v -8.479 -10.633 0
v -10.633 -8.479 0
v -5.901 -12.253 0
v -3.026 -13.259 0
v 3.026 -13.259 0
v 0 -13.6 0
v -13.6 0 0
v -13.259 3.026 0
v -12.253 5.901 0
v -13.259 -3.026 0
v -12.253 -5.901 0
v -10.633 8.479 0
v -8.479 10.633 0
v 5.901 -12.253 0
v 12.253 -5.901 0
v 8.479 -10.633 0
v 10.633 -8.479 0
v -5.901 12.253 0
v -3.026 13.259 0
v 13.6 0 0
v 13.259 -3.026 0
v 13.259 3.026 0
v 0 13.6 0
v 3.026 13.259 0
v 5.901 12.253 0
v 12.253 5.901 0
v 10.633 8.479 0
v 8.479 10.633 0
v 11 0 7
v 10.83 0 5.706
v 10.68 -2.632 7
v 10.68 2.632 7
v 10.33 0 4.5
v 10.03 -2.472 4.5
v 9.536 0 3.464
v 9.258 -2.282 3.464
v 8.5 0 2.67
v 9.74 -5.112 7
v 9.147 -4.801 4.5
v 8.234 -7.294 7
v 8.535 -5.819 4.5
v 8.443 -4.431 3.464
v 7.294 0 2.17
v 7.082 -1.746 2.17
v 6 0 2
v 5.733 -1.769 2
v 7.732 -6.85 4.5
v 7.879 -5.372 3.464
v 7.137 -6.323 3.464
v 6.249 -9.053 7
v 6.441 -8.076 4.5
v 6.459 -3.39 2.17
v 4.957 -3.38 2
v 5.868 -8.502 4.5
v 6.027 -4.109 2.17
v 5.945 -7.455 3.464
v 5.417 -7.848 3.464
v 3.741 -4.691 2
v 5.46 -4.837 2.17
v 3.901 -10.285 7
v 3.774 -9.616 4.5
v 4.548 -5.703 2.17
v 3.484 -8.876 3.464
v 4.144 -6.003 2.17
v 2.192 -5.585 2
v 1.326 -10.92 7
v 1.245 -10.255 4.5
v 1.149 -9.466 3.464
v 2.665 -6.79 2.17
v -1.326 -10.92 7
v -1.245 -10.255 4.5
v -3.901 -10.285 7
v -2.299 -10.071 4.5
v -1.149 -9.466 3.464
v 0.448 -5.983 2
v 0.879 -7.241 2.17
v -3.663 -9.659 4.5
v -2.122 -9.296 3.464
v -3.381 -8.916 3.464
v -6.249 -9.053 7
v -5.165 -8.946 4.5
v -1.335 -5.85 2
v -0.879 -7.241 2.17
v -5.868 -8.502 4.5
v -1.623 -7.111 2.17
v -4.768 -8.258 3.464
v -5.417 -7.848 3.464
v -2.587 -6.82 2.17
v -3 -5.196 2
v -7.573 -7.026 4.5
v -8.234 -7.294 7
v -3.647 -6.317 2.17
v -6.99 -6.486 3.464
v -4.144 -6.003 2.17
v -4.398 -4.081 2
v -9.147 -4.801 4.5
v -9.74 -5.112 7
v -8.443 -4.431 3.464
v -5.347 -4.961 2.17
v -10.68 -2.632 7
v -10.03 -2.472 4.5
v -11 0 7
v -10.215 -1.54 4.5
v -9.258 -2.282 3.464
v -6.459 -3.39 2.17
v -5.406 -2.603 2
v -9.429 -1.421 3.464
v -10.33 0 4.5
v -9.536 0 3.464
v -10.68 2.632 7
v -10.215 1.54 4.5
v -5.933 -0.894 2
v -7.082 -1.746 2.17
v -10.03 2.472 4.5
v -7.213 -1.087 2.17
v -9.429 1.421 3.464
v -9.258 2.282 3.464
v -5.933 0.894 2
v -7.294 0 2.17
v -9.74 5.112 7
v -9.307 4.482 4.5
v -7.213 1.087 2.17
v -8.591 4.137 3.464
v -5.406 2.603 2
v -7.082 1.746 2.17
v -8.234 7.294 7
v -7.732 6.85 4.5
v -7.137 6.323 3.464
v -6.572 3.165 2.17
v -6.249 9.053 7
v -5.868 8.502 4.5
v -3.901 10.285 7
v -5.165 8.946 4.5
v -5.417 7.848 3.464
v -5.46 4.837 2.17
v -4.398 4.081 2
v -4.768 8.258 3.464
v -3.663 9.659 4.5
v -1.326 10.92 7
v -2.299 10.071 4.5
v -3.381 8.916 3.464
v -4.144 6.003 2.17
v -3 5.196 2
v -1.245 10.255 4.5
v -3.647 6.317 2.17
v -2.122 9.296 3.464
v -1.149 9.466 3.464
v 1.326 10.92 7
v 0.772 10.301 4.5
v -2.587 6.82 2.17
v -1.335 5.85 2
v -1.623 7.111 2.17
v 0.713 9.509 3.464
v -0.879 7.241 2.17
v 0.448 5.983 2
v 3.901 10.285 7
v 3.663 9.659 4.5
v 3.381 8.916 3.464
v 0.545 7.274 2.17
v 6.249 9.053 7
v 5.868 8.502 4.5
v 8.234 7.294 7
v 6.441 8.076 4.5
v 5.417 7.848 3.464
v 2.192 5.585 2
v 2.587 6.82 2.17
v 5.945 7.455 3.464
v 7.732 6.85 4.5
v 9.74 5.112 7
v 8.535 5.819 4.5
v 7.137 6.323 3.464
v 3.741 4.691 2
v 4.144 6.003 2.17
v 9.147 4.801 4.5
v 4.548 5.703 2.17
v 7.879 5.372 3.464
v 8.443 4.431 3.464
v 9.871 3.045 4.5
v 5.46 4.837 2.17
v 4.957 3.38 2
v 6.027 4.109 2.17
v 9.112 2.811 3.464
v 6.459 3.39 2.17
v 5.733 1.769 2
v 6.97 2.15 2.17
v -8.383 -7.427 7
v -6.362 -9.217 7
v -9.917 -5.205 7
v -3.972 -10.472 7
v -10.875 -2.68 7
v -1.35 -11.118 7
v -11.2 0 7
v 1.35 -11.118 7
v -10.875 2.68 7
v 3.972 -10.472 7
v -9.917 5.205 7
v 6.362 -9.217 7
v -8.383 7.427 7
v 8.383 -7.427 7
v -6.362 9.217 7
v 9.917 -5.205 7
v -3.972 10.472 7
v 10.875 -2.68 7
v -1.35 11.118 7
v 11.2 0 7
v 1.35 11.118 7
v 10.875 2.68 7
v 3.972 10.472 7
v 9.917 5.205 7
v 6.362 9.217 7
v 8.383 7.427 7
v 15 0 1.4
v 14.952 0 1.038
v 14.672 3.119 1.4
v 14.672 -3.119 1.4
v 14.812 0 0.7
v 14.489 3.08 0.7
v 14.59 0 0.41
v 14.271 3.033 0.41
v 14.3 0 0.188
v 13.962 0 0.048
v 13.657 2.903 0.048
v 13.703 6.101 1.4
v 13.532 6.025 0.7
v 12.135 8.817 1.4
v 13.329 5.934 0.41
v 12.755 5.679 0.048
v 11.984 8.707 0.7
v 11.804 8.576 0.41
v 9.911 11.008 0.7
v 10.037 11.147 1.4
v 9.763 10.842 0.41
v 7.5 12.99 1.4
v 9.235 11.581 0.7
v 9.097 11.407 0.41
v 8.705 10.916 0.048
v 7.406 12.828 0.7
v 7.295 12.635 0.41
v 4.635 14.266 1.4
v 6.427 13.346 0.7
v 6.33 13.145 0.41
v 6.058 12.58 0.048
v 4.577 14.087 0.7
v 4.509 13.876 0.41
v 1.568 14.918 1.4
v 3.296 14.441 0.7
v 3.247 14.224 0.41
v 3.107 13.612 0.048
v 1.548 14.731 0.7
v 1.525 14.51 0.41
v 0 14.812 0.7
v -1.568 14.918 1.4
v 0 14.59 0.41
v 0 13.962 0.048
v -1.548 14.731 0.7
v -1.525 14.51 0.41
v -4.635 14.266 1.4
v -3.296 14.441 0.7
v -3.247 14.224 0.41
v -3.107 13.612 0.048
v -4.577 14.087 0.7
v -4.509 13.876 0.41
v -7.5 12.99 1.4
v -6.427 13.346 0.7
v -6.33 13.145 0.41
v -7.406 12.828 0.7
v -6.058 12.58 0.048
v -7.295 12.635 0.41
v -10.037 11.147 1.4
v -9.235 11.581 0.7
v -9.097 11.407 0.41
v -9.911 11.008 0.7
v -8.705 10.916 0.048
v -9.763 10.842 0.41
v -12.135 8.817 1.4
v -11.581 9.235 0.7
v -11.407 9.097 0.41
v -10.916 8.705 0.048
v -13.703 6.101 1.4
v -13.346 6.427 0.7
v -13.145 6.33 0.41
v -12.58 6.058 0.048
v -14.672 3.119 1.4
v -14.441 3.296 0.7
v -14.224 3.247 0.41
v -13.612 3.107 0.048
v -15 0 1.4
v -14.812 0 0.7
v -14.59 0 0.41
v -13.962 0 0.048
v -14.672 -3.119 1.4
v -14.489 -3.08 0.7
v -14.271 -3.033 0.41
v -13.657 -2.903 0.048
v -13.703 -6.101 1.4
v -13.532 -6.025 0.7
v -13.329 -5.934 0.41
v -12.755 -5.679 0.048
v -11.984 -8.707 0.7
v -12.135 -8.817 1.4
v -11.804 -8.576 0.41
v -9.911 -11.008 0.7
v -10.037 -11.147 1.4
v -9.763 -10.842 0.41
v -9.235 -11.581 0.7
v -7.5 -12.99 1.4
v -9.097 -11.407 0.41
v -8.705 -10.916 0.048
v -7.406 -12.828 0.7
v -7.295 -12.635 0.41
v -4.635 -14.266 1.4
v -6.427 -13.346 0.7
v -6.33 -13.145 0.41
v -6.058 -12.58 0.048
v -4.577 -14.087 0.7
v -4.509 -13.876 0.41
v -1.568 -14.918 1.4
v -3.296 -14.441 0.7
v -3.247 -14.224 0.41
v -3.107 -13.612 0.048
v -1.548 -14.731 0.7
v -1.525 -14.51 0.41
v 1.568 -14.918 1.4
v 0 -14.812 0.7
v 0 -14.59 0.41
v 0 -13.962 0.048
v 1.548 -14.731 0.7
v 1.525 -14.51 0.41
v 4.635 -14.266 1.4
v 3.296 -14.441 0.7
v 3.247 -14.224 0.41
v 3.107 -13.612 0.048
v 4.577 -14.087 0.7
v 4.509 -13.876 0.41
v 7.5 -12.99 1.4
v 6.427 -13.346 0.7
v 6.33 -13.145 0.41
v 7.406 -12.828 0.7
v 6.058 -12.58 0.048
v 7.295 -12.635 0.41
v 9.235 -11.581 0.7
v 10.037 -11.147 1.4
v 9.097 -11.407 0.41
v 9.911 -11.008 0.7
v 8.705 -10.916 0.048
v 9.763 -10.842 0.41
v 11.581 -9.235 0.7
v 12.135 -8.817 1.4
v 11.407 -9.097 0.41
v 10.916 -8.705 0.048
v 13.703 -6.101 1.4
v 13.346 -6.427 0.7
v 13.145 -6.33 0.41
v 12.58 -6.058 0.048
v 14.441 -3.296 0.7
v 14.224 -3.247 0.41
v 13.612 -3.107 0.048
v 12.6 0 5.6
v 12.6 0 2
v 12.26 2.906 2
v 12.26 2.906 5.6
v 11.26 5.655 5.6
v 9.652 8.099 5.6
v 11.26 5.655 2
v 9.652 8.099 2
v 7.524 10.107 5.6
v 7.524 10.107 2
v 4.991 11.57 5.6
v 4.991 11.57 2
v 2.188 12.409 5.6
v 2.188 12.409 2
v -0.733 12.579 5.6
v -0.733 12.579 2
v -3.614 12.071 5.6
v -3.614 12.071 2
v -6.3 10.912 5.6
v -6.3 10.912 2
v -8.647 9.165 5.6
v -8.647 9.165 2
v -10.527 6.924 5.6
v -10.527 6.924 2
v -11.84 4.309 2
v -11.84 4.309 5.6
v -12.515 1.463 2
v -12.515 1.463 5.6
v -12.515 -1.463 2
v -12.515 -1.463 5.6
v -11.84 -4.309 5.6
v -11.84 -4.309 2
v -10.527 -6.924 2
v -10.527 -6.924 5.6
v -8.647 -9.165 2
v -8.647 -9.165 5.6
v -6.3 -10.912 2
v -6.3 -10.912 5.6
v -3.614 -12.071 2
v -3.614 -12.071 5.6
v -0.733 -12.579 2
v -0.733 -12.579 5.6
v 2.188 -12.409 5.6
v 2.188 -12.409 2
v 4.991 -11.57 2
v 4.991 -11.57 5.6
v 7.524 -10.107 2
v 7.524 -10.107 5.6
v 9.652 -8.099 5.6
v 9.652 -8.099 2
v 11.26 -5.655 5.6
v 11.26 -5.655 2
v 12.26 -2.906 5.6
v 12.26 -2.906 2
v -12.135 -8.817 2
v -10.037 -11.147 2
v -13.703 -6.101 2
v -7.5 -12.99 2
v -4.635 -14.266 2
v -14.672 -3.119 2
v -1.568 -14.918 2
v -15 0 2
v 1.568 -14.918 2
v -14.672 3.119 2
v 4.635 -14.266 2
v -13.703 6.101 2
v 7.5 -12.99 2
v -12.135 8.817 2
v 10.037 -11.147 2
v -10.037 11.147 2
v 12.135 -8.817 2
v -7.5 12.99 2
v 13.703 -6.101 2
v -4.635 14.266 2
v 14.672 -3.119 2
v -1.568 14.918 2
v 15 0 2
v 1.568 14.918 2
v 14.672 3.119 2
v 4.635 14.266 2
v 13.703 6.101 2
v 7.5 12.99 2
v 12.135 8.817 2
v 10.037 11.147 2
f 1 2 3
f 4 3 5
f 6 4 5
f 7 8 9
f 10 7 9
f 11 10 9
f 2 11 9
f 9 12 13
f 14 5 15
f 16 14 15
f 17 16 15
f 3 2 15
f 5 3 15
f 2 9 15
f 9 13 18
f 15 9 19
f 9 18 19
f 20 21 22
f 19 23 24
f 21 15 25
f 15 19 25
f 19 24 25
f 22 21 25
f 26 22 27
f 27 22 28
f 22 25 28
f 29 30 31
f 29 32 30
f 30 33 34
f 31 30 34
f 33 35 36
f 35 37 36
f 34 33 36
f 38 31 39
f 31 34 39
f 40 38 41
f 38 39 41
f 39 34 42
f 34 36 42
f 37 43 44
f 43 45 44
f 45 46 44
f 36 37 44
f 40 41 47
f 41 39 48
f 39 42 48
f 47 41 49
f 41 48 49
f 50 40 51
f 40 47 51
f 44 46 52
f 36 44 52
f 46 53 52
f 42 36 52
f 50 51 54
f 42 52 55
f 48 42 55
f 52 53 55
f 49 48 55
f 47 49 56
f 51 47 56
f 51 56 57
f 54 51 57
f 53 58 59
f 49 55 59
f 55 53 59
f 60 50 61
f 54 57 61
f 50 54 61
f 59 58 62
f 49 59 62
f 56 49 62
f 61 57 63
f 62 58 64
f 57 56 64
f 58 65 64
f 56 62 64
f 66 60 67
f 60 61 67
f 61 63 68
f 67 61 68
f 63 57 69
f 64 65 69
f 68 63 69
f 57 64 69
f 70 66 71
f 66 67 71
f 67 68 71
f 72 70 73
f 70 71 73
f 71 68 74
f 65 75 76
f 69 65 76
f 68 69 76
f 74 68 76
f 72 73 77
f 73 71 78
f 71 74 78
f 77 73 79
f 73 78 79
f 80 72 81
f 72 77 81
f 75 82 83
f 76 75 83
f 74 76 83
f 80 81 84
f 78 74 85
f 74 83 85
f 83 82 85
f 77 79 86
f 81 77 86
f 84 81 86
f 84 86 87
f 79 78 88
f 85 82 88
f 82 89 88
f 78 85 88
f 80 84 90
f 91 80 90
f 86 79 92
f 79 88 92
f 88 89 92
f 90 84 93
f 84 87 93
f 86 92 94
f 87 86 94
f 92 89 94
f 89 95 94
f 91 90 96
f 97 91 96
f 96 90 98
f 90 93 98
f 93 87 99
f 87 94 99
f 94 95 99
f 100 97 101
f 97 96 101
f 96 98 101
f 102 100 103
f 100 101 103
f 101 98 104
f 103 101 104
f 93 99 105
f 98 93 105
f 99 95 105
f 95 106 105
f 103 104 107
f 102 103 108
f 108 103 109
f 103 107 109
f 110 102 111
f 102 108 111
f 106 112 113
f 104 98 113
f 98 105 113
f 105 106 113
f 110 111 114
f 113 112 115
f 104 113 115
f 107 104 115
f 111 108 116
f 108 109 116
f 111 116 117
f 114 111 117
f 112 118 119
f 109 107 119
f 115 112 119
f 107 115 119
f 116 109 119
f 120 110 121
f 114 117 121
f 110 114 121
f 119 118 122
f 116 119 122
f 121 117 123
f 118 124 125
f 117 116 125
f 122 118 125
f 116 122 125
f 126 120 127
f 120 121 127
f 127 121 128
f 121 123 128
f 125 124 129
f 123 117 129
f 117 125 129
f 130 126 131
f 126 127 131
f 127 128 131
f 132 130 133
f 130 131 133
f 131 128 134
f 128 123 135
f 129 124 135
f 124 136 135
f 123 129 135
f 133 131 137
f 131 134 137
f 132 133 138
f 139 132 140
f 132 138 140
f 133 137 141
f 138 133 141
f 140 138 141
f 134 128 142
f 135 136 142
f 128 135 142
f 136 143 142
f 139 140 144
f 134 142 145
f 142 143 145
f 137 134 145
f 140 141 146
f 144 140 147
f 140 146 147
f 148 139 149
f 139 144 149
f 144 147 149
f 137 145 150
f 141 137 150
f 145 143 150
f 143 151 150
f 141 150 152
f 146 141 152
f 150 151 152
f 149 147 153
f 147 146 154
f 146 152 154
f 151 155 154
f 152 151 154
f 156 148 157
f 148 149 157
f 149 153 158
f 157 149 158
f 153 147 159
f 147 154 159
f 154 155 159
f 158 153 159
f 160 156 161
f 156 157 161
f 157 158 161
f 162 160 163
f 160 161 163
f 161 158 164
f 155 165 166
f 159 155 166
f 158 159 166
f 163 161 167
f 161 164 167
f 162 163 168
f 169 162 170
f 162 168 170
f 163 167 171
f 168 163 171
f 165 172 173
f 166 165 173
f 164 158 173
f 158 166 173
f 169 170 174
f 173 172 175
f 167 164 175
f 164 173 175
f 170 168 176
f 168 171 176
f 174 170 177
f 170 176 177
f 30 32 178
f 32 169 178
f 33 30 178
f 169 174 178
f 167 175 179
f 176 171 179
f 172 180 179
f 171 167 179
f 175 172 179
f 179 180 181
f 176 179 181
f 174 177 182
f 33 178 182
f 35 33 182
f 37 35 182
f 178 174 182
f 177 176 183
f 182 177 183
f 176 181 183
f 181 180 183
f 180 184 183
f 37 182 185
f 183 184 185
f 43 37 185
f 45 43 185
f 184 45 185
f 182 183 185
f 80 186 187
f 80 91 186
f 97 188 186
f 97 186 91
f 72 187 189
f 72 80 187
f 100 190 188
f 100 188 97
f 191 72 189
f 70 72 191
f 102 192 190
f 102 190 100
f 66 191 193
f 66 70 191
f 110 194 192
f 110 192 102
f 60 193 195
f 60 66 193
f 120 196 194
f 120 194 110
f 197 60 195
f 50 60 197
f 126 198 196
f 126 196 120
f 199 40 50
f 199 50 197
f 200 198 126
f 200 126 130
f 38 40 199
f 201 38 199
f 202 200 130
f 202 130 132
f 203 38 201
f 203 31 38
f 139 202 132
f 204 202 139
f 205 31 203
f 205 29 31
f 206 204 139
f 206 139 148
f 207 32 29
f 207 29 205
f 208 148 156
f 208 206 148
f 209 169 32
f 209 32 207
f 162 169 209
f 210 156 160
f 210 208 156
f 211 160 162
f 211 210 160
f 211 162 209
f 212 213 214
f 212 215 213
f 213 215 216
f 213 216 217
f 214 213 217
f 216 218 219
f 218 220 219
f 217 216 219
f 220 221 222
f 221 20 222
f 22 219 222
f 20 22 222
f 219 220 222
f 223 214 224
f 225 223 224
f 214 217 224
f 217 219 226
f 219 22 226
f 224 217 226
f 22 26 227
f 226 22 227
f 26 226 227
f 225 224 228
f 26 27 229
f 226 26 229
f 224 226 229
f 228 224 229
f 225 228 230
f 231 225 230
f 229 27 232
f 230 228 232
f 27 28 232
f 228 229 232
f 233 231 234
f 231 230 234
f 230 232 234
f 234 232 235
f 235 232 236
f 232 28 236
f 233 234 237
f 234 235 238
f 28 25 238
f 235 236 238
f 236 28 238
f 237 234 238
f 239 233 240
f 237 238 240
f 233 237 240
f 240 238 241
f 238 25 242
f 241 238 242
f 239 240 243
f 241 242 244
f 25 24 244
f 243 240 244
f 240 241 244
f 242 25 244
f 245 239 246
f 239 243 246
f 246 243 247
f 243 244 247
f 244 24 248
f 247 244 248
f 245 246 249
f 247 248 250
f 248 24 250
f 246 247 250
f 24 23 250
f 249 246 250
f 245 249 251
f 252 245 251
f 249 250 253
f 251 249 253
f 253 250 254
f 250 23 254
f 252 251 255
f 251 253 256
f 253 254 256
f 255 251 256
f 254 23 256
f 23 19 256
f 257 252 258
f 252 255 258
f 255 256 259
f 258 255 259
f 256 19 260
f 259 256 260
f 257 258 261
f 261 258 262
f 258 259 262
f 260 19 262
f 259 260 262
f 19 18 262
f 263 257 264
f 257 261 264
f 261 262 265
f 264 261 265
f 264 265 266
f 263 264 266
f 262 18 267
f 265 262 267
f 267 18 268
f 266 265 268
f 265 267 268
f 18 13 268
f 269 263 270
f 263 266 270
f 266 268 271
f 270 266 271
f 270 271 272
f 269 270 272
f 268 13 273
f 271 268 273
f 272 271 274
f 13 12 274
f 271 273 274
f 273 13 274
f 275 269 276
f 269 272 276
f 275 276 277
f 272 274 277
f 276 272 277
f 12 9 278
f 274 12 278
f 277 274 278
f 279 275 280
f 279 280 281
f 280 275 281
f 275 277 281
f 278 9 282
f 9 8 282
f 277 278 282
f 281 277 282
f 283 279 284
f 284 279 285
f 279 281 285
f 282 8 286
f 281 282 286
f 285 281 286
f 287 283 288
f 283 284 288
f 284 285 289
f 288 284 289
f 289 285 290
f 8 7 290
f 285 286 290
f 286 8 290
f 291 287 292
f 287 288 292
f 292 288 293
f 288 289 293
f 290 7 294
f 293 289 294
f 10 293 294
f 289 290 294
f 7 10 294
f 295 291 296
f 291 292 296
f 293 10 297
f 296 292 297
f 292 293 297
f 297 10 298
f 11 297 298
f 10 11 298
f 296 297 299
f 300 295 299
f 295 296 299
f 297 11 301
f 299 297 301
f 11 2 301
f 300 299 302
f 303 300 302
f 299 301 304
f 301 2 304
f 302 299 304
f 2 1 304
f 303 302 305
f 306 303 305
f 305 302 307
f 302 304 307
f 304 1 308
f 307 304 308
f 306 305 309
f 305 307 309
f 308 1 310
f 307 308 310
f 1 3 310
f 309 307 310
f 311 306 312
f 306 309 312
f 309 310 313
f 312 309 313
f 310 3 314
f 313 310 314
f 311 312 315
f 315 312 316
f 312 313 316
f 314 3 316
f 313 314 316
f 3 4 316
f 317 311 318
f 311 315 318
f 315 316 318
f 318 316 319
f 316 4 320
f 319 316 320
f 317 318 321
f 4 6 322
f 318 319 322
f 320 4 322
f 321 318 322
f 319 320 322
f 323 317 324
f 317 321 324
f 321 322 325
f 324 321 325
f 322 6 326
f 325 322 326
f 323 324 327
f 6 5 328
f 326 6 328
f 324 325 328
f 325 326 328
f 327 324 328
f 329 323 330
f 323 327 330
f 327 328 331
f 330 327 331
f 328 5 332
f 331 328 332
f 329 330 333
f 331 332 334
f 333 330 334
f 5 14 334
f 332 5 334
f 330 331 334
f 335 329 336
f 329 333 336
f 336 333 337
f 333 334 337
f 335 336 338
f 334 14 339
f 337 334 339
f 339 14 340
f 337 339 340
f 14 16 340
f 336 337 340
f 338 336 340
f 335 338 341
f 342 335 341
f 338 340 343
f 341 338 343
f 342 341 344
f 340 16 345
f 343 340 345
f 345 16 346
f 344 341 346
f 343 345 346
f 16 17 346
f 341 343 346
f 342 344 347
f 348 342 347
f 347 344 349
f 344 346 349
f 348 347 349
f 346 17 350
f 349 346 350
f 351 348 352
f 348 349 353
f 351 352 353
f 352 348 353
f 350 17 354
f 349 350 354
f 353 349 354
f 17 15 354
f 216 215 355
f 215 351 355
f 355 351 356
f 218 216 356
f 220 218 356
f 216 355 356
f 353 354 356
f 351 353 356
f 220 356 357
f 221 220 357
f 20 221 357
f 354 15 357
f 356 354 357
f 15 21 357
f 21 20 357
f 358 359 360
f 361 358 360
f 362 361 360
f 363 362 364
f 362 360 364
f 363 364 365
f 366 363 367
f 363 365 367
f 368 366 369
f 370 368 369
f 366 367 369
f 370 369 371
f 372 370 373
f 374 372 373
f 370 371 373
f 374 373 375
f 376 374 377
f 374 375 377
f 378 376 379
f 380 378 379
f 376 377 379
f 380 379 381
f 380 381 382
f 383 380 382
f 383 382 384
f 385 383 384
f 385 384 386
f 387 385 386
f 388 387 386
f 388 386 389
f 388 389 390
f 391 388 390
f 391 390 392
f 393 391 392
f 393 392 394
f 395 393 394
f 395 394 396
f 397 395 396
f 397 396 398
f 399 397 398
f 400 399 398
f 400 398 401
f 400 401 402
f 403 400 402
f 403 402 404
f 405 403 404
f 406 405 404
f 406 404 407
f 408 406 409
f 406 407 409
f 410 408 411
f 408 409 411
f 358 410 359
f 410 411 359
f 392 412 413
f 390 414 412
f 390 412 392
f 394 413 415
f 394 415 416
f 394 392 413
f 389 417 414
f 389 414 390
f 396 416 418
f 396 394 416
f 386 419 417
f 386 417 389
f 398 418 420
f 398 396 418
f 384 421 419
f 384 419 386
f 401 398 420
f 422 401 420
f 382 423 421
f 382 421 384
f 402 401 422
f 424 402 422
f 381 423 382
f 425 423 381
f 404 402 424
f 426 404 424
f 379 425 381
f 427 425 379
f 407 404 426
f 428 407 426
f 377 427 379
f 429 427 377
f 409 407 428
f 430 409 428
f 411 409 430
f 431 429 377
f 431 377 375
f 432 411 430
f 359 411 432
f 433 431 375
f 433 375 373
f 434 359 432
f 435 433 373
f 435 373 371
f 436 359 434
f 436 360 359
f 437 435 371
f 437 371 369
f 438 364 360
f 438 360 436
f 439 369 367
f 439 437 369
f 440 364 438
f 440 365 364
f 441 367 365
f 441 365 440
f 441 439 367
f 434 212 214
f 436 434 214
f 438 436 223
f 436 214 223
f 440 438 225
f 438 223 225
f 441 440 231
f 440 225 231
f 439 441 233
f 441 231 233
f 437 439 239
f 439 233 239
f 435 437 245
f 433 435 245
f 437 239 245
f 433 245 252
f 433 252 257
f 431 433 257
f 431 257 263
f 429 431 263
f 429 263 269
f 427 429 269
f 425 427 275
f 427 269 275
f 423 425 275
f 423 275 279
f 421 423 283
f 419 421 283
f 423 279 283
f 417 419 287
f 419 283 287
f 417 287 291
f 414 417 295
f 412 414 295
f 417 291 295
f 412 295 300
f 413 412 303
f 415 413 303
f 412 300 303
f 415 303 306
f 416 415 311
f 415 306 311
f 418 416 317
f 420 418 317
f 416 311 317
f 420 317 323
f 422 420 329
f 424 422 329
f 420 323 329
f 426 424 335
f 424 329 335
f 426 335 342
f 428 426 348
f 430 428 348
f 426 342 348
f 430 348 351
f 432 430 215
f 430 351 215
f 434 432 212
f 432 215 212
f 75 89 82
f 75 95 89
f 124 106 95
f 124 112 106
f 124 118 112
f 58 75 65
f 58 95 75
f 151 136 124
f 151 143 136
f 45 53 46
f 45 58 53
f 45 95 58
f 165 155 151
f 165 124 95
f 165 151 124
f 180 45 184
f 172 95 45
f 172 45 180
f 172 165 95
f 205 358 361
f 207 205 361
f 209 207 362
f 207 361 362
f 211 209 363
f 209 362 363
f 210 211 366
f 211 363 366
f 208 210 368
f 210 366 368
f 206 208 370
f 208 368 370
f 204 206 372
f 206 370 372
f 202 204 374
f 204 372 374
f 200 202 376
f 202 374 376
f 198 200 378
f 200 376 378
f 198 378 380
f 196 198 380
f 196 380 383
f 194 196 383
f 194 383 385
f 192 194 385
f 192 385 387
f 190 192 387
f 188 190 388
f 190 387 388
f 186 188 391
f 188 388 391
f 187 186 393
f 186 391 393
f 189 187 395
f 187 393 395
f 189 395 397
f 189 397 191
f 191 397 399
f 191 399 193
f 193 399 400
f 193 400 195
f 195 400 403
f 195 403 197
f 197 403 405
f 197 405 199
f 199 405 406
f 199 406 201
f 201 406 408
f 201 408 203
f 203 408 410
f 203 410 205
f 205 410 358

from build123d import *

# Parameters (mm, degrees)
F0_R     = 15
F0_R_2   = 13
F0_R_3   = 12.6
F0_R_4   = 11
F1_DEPTH = 2
F2_DEPTH = 7
F3_R     = 4.99999
F4_SIZE  = 1.4
F5_R     = 1.4


# Not quite as in the source:
# - a fillet or chamfer is up to 0.001 mm smaller than in the source, because OpenCascade refuses the exact size


with BuildPart() as f1:
    # F0 (on Top) → F1 (new body)
    with BuildSketch(Plane.XY):
        Circle(F0_R)
        Circle(F0_R_2, mode=Mode.SUBTRACT)
        Circle(F0_R_2)
        Circle(F0_R_3, mode=Mode.SUBTRACT)
        Circle(F0_R_3)
        Circle(F0_R_4, mode=Mode.SUBTRACT)
        Circle(F0_R_4)
    extrude(amount=F1_DEPTH)

    # F0 (on Top) → F2 (join)
    with BuildSketch(Plane.XY):
        Circle(F0_R_3)
        Circle(F0_R_4, mode=Mode.SUBTRACT)
    extrude(amount=F2_DEPTH)

    # F3 (radius 5 in the source; OpenCascade refuses exactly that, so slightly less here)
    f3_edges = [f1.edges().sort_by_distance(p)[0] for p in [
        (-11, 0, 2),
    ]]
    fillet(f3_edges, radius=F3_R)

    # F4
    f4_edges = [f1.edges().sort_by_distance(p)[0] for p in [
        (-12.6, 0, 7),
    ]]
    chamfer(f4_edges, length=F4_SIZE)

    # F5
    f5_edges = [f1.edges().sort_by_distance(p)[0] for p in [
        (-15, 0, 0),
    ]]
    fillet(f5_edges, radius=F5_R)


solid = f1.part
